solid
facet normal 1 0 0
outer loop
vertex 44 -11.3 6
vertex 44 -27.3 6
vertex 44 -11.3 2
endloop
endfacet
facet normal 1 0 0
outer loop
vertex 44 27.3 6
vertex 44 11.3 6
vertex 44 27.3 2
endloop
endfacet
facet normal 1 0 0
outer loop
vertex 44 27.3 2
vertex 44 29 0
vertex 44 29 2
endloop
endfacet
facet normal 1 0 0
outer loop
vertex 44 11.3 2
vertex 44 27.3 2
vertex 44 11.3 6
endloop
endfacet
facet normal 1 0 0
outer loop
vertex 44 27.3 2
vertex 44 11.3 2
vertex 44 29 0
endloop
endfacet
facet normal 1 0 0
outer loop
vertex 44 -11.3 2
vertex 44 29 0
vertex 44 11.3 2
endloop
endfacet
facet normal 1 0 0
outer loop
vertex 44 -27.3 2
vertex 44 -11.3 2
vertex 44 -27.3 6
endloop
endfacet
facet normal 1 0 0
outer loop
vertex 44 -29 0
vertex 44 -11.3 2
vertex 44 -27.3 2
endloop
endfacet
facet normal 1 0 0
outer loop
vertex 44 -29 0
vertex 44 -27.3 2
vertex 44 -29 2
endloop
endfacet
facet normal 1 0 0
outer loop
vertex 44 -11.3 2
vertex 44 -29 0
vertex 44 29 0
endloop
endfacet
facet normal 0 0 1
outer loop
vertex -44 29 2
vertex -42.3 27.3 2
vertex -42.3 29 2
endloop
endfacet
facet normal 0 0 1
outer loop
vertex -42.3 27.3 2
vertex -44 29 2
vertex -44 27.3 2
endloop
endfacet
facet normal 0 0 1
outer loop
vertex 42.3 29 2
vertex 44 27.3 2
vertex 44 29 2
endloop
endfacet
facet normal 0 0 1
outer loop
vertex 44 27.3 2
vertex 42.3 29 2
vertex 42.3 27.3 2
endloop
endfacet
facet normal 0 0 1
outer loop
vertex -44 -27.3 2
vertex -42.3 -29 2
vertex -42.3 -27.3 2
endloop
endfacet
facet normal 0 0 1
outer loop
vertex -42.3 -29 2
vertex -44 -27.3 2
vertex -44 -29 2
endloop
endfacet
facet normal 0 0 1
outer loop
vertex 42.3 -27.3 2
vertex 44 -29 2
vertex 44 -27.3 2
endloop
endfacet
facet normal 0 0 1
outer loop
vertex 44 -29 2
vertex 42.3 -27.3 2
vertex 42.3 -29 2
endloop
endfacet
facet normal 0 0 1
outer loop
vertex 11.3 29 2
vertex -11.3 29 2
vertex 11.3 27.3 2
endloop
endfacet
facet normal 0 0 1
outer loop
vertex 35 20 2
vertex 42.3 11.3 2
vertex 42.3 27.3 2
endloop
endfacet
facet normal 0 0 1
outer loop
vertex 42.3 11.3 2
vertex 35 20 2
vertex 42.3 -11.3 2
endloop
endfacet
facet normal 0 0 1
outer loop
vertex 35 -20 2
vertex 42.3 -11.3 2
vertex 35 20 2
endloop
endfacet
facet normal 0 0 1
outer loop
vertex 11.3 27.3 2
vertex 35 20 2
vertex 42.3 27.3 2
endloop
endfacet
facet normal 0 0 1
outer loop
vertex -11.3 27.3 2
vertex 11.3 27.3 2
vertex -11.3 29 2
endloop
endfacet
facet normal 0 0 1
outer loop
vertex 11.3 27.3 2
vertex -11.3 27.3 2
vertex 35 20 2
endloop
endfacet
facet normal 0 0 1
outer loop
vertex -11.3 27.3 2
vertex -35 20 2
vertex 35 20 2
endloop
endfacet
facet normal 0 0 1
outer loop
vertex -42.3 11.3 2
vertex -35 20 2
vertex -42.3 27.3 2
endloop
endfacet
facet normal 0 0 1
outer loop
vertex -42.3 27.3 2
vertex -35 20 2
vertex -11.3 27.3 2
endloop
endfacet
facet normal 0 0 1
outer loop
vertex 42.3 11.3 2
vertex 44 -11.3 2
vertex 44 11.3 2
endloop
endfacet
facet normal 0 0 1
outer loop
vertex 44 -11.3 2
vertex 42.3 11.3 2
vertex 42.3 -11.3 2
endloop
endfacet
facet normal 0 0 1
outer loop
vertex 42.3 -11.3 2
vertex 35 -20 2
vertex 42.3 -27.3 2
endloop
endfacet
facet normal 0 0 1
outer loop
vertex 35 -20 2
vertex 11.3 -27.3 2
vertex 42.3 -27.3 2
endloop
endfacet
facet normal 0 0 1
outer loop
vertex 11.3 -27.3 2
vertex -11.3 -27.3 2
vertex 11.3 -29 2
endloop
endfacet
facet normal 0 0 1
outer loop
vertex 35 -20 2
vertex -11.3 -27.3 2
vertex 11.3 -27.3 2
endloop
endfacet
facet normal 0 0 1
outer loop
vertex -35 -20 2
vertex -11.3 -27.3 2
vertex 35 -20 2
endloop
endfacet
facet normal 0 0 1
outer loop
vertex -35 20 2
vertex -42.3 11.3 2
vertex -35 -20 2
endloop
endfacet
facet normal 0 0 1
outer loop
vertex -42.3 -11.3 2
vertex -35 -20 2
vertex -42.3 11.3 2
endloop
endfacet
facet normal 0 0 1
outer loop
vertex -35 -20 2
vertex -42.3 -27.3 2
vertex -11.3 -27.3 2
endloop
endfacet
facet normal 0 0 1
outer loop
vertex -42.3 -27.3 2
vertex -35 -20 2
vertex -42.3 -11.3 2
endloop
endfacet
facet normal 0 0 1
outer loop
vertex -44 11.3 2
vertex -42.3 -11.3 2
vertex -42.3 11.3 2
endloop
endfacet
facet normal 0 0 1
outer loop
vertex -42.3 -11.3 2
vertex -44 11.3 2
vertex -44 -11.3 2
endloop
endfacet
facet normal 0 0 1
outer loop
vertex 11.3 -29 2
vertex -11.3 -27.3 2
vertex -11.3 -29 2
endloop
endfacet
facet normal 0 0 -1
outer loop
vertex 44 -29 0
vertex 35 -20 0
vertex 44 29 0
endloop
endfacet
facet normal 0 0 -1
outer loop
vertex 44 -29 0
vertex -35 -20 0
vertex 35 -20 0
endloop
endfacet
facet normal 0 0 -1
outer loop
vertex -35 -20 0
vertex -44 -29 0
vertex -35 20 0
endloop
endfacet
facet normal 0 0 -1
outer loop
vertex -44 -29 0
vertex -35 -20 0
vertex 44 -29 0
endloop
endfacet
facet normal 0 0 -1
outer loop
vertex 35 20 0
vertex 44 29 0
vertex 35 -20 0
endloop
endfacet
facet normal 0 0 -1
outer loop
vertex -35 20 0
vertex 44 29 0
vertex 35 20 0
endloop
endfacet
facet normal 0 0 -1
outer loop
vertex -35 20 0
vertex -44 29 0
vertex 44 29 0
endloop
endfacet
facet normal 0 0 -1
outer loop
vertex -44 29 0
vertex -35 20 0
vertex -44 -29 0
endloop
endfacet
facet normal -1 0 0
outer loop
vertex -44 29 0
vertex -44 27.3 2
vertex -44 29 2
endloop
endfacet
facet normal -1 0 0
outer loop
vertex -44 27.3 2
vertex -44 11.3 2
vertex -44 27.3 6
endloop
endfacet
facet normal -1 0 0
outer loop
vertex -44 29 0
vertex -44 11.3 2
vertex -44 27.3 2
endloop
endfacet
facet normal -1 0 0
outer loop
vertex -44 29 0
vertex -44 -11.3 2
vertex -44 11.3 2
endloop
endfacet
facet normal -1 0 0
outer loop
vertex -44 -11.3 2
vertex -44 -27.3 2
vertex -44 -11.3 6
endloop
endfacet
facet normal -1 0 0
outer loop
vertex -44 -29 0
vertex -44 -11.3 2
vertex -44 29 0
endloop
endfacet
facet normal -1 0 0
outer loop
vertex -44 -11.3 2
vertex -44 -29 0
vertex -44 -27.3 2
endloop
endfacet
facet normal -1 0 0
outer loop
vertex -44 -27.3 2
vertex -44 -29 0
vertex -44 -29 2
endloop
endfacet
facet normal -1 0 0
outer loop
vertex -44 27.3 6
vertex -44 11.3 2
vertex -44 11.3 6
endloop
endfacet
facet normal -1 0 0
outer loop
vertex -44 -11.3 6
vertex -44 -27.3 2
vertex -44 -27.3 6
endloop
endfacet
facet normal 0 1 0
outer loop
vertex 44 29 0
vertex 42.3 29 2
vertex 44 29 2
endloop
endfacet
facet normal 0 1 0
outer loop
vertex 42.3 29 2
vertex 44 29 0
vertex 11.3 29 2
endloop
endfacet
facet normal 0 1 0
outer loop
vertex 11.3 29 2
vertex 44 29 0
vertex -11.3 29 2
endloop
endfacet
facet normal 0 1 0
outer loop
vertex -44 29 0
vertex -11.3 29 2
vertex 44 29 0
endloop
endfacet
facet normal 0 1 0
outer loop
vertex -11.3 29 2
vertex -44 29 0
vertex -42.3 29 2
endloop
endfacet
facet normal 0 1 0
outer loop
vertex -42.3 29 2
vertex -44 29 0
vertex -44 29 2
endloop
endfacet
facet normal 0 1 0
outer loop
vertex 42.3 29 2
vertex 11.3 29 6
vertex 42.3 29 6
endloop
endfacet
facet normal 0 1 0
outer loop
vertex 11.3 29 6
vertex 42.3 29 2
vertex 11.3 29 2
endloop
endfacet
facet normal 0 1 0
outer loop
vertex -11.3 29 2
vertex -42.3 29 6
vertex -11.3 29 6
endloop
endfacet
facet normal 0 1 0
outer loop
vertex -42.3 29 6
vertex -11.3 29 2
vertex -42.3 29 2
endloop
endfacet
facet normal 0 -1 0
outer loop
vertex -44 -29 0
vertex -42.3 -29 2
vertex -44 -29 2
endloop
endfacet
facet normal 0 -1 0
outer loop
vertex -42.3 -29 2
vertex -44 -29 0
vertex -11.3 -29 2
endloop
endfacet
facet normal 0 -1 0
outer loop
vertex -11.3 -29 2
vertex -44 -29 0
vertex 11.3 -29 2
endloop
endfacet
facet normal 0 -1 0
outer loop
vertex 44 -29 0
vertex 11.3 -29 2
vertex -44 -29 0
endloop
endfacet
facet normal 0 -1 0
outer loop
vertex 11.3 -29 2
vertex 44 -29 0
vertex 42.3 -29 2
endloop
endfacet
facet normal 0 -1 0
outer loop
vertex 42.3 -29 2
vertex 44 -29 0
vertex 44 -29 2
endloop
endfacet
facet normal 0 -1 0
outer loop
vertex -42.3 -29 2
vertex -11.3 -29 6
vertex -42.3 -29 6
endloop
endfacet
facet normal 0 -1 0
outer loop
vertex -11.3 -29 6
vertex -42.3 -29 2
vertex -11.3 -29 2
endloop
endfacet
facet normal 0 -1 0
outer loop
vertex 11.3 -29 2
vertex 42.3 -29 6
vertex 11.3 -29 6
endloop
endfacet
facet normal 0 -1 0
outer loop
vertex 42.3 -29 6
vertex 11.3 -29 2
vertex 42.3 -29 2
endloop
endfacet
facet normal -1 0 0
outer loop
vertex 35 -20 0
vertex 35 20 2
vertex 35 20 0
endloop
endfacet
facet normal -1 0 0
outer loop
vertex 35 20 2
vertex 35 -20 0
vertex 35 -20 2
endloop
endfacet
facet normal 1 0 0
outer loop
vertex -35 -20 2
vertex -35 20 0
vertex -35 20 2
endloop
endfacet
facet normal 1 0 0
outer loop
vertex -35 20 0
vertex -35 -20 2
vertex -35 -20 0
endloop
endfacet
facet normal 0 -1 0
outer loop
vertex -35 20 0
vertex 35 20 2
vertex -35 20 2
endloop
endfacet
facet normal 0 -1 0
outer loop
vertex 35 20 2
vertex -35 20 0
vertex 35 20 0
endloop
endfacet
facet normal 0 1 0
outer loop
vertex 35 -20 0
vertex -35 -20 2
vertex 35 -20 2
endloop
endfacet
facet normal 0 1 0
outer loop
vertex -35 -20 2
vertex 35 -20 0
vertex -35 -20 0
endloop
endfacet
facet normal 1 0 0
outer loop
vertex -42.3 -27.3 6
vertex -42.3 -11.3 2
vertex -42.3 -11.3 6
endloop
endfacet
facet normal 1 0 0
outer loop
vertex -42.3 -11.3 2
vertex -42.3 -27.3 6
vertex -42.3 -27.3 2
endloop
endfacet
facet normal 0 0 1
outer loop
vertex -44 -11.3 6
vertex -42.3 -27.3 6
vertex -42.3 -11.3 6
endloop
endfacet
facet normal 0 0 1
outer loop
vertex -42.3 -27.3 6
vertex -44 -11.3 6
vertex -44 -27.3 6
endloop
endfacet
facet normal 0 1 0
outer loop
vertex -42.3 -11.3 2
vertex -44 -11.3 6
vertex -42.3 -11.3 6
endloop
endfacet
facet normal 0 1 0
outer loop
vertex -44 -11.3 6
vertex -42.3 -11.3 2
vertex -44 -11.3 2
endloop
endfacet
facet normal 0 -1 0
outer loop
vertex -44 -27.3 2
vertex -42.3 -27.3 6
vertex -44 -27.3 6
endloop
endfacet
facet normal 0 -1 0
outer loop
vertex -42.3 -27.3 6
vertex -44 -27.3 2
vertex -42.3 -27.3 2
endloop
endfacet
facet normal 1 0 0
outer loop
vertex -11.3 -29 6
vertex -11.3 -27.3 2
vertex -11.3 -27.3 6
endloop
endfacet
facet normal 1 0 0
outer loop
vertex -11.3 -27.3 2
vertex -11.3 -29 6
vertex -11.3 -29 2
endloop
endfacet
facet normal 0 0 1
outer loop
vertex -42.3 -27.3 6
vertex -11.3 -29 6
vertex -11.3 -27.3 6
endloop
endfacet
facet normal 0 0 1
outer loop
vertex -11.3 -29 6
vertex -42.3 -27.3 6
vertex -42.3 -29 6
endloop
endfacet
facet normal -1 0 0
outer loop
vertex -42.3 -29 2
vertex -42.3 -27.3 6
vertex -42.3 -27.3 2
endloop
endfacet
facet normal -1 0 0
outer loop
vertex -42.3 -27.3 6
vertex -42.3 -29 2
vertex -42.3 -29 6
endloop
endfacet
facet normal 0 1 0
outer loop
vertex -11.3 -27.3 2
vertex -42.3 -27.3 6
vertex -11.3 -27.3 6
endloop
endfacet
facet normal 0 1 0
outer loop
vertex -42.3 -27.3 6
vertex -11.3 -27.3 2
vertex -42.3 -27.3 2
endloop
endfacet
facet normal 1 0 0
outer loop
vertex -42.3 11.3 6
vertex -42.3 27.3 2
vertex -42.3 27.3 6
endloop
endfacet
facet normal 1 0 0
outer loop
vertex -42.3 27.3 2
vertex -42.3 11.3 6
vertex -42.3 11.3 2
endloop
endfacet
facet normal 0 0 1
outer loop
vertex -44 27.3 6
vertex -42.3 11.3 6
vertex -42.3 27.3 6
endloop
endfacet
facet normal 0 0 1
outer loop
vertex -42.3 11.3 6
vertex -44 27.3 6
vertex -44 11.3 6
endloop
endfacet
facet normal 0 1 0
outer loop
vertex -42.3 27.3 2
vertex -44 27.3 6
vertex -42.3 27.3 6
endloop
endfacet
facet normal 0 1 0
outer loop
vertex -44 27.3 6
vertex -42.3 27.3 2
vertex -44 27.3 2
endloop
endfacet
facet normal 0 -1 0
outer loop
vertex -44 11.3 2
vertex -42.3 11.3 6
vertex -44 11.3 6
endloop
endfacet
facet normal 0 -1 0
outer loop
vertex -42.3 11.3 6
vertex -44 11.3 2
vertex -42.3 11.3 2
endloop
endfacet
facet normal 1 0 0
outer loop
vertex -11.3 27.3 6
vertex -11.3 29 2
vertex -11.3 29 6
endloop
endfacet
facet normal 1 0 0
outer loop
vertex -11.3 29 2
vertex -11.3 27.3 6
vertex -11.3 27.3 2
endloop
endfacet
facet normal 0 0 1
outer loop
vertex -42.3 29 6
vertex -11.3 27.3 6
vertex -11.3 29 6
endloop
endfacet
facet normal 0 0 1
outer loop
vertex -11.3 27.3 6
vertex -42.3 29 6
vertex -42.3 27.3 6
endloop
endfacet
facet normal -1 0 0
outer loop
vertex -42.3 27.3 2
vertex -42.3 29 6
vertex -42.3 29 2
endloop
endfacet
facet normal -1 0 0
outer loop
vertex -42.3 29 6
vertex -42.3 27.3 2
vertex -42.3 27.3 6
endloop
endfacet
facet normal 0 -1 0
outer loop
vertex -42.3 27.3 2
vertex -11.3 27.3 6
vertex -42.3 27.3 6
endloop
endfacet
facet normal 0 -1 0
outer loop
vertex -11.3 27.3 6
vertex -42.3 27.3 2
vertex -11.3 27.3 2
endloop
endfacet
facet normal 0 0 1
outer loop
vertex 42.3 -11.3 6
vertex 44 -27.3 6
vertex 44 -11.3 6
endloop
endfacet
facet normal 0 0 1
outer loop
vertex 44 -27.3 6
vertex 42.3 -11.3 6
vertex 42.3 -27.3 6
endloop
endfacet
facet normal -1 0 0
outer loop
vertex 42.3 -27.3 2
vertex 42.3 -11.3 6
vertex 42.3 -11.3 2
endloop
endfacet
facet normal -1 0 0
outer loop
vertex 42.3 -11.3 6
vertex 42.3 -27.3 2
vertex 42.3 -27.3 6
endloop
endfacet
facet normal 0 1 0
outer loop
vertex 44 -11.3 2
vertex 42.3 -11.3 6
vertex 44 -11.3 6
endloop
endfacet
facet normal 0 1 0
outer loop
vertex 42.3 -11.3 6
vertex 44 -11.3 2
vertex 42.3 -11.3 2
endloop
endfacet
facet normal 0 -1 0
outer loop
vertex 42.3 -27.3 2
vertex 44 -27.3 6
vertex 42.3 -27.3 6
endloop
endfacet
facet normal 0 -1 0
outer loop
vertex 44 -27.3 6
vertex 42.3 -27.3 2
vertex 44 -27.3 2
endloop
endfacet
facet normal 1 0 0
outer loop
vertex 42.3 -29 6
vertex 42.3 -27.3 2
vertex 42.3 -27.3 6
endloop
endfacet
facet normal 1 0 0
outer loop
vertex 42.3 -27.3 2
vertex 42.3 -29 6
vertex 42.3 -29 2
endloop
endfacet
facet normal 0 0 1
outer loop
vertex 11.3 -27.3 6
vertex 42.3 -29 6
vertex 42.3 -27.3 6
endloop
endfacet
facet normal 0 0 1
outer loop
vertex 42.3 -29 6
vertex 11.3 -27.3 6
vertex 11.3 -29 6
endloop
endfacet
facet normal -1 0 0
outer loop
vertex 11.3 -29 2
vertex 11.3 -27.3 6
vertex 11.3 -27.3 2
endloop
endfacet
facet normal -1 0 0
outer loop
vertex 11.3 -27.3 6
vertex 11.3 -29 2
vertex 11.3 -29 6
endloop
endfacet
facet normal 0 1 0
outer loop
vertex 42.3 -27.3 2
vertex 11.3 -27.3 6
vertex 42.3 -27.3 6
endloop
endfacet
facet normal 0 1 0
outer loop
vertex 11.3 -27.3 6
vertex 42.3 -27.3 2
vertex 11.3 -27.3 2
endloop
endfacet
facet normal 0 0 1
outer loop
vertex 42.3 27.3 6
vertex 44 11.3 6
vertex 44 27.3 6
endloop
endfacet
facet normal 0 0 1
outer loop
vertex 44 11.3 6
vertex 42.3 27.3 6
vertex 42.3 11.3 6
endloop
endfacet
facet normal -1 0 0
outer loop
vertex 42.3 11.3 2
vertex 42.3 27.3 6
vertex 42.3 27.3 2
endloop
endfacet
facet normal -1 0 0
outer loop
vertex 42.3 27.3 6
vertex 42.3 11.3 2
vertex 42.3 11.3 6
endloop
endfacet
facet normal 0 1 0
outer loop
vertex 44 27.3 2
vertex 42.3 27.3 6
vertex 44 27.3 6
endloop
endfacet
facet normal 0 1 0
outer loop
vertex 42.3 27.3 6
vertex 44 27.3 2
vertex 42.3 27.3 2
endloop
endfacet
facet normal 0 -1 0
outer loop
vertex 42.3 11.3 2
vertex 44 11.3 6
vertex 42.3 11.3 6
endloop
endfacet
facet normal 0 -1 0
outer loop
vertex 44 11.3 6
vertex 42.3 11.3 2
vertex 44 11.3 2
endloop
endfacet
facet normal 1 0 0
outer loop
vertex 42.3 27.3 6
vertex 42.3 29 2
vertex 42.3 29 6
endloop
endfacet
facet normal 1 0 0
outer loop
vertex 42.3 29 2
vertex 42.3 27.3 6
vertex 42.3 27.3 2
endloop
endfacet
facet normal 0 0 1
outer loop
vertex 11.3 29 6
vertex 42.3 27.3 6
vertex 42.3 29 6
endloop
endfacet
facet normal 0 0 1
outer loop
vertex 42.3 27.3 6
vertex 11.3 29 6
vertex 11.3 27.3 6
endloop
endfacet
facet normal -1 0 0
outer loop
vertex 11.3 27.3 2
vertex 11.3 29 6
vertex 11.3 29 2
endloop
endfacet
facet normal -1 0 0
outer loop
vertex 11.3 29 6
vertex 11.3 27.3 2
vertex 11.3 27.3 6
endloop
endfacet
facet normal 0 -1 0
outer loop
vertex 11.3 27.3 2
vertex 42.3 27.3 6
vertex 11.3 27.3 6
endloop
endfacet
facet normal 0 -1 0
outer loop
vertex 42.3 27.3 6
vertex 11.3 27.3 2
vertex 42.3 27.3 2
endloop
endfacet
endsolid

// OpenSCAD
// Mini Studio 16 open bench cradle for M5Stack Cardputer-ADV.
// Original parametric design; pre-hardware fit prototype.
// Published device envelope: 84 x 54 mm. Default clearance: 0.30 mm/side.

device_x = 84.0;
device_y = 54.0;
clearance = 0.30;
outer_x = 88.0;
outer_y = 58.0;
base_height = 2.0;
wall_height = 6.0;
center_opening_x = 70.0;
center_opening_y = 40.0;
side_clip_span_y = 32.0;
end_clip_span_x = 62.0;

cavity_x = device_x + 2 * clearance;
cavity_y = device_y + 2 * clearance;
wall_x = (outer_x - cavity_x) / 2;
wall_y = (outer_y - cavity_y) / 2;

module centered_cube(size) {
    translate([-size[0] / 2, -size[1] / 2, 0]) cube(size);
}

union() {
    // Ventilated bottom frame.
    difference() {
        centered_cube([outer_x, outer_y, base_height]);
        translate([0, 0, -0.1])
            centered_cube([center_opening_x, center_opening_y, base_height + 0.2]);
    }

    // Four open corner guides. Side/end centers stay clear for ports.
    for (sx = [-1, 1])
        for (sy = [-1, 1]) {
            translate([sx * (cavity_x / 2 + wall_x / 2),
                       sy * (cavity_y / 2 - side_clip_span_y / 4), 0])
                centered_cube([wall_x, side_clip_span_y / 2, wall_height]);
            translate([sx * (cavity_x / 2 - end_clip_span_x / 4),
                       sy * (cavity_y / 2 + wall_y / 2), 0])
                centered_cube([end_clip_span_x / 2, wall_y, wall_height]);
        }
}
